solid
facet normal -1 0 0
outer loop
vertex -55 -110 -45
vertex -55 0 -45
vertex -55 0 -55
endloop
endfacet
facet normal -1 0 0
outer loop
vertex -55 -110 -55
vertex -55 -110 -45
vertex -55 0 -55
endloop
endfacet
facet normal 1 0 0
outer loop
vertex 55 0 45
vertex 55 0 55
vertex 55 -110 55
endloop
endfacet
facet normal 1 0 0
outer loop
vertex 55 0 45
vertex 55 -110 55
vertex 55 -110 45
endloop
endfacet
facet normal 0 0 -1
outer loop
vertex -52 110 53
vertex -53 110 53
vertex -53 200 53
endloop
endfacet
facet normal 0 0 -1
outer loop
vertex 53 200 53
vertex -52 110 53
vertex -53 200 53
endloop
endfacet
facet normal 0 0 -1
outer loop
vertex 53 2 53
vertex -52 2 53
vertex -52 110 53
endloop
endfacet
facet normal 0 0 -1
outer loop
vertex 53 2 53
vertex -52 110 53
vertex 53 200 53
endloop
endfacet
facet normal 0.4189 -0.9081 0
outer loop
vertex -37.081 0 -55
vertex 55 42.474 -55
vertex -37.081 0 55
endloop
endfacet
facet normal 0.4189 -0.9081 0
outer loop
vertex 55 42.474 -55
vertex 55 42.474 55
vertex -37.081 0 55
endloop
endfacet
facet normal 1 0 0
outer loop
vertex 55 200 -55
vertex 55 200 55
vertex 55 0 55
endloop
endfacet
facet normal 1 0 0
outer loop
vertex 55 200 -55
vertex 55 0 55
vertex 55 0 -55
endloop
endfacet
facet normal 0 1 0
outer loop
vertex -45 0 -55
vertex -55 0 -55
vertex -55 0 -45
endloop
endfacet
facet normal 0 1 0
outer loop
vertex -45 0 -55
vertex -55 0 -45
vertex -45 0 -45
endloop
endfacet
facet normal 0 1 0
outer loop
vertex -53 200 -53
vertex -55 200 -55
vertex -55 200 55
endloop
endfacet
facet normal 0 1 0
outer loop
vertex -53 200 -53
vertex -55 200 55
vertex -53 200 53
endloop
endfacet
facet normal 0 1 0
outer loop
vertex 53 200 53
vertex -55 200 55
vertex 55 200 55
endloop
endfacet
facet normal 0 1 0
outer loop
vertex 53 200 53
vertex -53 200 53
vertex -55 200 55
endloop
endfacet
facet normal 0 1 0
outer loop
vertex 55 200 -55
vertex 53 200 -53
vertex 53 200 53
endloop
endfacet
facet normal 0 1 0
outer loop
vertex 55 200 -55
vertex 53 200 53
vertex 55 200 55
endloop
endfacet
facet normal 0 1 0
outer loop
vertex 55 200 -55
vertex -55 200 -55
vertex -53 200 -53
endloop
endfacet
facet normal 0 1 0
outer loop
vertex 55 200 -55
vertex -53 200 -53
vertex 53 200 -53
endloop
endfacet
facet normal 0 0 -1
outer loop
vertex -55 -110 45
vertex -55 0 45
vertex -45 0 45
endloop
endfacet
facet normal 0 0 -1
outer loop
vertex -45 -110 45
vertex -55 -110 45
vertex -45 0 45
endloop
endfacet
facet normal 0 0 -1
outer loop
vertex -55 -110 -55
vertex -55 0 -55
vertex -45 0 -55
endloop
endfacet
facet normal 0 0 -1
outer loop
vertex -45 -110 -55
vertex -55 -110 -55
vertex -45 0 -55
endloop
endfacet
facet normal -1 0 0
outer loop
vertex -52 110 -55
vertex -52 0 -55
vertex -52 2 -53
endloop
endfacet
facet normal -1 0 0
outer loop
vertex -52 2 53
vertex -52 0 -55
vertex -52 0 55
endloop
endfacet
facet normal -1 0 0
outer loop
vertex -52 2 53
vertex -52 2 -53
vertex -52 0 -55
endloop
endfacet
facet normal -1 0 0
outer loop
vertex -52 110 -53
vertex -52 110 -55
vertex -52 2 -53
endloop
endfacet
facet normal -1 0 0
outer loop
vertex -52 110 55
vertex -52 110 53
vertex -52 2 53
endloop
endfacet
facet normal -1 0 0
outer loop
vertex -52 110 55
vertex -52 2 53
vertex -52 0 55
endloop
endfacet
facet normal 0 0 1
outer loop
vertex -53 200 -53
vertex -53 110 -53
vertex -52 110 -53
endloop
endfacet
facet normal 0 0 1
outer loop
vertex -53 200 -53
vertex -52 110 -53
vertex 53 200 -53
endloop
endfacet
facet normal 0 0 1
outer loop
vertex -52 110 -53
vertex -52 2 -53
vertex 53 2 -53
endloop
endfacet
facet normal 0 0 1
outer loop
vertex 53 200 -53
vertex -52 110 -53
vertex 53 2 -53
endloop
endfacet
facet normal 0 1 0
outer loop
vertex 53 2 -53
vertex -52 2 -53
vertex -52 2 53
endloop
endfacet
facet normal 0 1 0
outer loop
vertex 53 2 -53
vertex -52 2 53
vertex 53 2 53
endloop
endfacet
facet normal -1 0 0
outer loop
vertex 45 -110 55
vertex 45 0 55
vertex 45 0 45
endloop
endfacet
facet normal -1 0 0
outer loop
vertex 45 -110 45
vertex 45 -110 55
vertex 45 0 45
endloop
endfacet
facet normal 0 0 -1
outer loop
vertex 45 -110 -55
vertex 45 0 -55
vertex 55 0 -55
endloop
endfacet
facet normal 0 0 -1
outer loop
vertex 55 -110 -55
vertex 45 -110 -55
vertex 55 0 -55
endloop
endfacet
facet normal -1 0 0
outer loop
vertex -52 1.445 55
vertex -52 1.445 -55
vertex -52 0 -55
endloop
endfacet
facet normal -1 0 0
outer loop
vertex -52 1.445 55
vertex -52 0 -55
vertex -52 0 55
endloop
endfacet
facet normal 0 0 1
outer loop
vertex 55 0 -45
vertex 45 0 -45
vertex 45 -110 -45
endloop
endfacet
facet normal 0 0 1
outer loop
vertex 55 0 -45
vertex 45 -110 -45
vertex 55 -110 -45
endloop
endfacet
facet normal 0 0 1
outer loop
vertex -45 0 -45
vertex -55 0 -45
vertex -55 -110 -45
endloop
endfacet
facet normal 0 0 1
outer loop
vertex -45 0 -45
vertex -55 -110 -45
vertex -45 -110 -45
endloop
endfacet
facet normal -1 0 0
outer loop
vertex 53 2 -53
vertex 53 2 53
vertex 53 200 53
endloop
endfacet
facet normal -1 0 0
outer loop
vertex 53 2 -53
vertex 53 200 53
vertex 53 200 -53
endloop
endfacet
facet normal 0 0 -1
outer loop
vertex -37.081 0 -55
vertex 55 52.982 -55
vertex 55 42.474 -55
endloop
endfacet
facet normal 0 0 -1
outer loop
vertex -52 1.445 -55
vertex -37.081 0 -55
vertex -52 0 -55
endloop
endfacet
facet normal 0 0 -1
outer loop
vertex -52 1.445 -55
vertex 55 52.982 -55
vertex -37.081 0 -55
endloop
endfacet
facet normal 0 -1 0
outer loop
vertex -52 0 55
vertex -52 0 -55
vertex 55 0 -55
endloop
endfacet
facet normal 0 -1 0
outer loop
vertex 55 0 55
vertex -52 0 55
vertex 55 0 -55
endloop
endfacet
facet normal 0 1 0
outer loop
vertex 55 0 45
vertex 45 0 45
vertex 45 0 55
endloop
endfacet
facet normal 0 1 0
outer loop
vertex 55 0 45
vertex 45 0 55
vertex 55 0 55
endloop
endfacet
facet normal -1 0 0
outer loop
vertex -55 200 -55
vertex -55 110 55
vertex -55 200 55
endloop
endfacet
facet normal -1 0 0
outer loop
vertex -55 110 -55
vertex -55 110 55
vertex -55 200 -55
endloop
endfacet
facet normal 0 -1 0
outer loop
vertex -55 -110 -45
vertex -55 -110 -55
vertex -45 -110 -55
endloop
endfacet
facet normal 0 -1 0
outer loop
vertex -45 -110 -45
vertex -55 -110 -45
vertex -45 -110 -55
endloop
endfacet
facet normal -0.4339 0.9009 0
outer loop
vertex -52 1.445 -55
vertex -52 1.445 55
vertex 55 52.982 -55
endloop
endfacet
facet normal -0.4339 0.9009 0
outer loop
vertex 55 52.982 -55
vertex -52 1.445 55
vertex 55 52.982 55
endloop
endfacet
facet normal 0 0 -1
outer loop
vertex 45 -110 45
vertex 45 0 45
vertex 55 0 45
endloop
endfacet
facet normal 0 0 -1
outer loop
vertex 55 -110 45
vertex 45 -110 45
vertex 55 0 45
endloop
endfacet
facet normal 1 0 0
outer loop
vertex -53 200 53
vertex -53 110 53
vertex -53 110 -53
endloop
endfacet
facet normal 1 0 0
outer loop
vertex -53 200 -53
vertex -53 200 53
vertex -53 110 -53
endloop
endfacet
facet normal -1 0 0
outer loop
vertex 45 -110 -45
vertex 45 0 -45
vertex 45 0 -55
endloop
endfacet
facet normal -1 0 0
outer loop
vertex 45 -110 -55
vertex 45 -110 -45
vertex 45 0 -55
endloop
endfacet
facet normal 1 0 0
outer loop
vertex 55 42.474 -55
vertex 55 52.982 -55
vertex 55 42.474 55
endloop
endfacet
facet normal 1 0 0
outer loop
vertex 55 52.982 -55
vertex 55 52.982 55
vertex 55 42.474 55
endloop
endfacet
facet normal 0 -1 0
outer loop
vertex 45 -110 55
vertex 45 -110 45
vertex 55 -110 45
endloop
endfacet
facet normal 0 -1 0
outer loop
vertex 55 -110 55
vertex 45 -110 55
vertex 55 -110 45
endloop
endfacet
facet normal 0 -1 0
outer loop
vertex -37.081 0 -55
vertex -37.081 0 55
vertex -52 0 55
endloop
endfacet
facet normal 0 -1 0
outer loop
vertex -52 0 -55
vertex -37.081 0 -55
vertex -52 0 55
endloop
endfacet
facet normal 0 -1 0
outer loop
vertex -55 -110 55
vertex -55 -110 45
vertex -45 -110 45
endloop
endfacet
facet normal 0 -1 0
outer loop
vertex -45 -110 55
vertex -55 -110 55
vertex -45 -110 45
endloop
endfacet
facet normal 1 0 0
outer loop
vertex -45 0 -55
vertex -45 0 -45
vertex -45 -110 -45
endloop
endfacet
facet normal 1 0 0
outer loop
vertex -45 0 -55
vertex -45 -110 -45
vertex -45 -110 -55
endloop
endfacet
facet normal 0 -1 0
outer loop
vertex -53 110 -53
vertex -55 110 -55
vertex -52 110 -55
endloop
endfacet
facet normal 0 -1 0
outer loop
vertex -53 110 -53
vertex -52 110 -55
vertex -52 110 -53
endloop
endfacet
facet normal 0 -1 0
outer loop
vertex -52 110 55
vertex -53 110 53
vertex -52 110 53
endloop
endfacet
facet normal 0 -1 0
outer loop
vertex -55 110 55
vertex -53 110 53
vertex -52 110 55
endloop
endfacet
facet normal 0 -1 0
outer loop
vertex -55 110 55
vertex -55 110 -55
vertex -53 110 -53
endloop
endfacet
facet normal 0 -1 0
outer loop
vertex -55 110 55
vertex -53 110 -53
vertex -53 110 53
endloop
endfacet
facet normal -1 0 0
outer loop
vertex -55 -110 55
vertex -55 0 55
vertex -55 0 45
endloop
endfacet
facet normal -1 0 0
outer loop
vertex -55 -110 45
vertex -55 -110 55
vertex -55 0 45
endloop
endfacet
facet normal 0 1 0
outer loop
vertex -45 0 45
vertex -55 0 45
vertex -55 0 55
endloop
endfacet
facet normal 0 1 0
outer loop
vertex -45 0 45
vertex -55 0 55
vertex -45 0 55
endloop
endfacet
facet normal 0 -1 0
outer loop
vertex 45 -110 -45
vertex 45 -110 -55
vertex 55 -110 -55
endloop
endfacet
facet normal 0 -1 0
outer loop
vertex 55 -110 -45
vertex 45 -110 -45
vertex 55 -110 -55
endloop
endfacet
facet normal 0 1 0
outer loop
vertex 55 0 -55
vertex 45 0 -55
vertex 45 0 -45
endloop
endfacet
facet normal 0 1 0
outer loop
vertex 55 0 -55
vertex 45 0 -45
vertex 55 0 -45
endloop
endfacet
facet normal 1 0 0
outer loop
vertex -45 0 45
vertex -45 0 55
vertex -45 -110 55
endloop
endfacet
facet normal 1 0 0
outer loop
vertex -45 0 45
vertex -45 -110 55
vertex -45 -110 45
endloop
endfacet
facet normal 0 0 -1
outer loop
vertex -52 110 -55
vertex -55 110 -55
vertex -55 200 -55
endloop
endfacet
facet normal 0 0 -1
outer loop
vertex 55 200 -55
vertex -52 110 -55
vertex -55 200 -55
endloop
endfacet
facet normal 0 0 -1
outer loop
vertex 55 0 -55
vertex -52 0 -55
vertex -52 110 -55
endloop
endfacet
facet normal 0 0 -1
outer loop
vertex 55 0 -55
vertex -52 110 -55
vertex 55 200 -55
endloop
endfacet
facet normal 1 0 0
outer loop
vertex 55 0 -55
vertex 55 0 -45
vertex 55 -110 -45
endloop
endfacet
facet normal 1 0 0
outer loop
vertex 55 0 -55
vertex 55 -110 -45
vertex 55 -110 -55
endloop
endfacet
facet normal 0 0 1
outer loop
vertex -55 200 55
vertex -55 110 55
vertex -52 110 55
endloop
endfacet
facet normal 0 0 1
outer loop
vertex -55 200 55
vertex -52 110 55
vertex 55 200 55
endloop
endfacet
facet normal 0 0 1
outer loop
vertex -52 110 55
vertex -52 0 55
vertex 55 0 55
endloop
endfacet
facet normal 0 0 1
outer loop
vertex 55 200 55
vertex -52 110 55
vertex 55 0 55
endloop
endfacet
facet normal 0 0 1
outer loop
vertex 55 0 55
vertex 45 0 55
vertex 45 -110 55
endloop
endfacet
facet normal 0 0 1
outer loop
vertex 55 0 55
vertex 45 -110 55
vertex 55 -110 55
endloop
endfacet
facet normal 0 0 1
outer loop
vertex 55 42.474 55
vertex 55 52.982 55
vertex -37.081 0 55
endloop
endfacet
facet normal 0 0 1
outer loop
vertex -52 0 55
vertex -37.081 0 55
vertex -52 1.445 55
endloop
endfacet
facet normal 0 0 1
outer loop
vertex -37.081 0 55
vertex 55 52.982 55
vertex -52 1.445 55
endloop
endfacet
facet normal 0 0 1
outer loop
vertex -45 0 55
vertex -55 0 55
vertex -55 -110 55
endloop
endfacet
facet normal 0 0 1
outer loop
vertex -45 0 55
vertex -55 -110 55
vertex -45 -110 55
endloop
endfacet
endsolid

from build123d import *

# Parameters (mm, degrees)
SKETCH1_W                = 110
SKETCH1_H                = 110
BOSS_EXTRUDE1_DEPTH      = 200
SHELL1_T                 = -2
SKETCH2_W                = 10
SKETCH2_H                = 10
BOSS_EXTRUDE2_DEPTH      = 110
BOSS_EXTRUDE2_2_DEPTH    = 110
BOSS_EXTRUDE2_3_DEPTH    = 110
BOSS_EXTRUDE2_4_DEPTH    = 110
BOSS_EXTRUDE3_DEPTH      = 55
BOSS_EXTRUDE3_DEPTH_BACK = 55
SKETCH4_W                = 110
SKETCH4_H                = 110
CUT_EXTRUDE1_DEPTH       = 3


with BuildPart() as part:
    # Sketch1 → Boss-Extrude1 (new body)
    with BuildSketch(Plane(origin=(0, 0, 0), x_dir=(1, 0, 0), z_dir=(0, 1, 0))):
        Rectangle(SKETCH1_W, SKETCH1_H)
    extrude(amount=BOSS_EXTRUDE1_DEPTH)

    # Shell1
    shell1_openings = [part.faces().sort_by_distance(p)[0] for p in [
        (0, 200, 0),
    ]]
    offset(amount=SHELL1_T, openings=shell1_openings, kind=Kind.INTERSECTION)


with BuildPart() as body_2:
    # Sketch2 → Boss-Extrude2 (new body)
    with BuildSketch(Plane(origin=(0, 0, 0), x_dir=(1, 0, 0), z_dir=(0, 1, 0))):
        with Locations((50, -50)):
            Rectangle(SKETCH2_W, SKETCH2_H)
    extrude(amount=-BOSS_EXTRUDE2_DEPTH)


with BuildPart() as body_3:
    # Sketch2 → Boss-Extrude2 2 (new body)
    with BuildSketch(Plane(origin=(0, 0, 0), x_dir=(1, 0, 0), z_dir=(0, 1, 0))):
        with Locations((50, 50)):
            Rectangle(SKETCH2_W, SKETCH2_H)
    extrude(amount=-BOSS_EXTRUDE2_2_DEPTH)


with BuildPart() as body_4:
    # Sketch2 → Boss-Extrude2 3 (new body)
    with BuildSketch(Plane(origin=(0, 0, 0), x_dir=(1, 0, 0), z_dir=(0, 1, 0))):
        with Locations((-50, -50)):
            Rectangle(SKETCH2_W, SKETCH2_H)
    extrude(amount=-BOSS_EXTRUDE2_3_DEPTH)


with BuildPart() as body_5:
    # Sketch2 → Boss-Extrude2 4 (new body)
    with BuildSketch(Plane(origin=(0, 0, 0), x_dir=(1, 0, 0), z_dir=(0, 1, 0))):
        with Locations((-50, 50)):
            Rectangle(SKETCH2_W, SKETCH2_H)
    extrude(amount=-BOSS_EXTRUDE2_4_DEPTH)


with BuildPart() as body_6:
    # Sketch3 → Boss-Extrude3 (new body, two sides)
    with BuildSketch(Plane.XY) as boss_extrude3_sk:
        Polygon((-55, 0), (55, 52.981975722), (55, 42.474058316), (-37.080823924, 0), align=None)
    extrude(amount=BOSS_EXTRUDE3_DEPTH)
    extrude(boss_extrude3_sk.sketch, amount=-BOSS_EXTRUDE3_DEPTH_BACK)


with BuildPart() as cut_extrude1_tool:
    # Sketch4 → Cut-Extrude1 (new body)
    with BuildSketch(Plane.ZY.offset(55)):
        with Locations((0, 55)):
            Rectangle(SKETCH4_W, SKETCH4_H)
    extrude(amount=-CUT_EXTRUDE1_DEPTH)


with BuildPart() as part_1:
    add(part.part)

    # Cut-Extrude1: cut by cut_extrude1_tool
    add(cut_extrude1_tool.part, mode=Mode.SUBTRACT)


with BuildPart() as body_6_1:
    add(body_6.part)

    # Cut-Extrude1: cut by cut_extrude1_tool
    add(cut_extrude1_tool.part, mode=Mode.SUBTRACT)


solid = Compound([body_2.part, body_3.part, body_4.part, body_5.part, part_1.part, body_6_1.part])
